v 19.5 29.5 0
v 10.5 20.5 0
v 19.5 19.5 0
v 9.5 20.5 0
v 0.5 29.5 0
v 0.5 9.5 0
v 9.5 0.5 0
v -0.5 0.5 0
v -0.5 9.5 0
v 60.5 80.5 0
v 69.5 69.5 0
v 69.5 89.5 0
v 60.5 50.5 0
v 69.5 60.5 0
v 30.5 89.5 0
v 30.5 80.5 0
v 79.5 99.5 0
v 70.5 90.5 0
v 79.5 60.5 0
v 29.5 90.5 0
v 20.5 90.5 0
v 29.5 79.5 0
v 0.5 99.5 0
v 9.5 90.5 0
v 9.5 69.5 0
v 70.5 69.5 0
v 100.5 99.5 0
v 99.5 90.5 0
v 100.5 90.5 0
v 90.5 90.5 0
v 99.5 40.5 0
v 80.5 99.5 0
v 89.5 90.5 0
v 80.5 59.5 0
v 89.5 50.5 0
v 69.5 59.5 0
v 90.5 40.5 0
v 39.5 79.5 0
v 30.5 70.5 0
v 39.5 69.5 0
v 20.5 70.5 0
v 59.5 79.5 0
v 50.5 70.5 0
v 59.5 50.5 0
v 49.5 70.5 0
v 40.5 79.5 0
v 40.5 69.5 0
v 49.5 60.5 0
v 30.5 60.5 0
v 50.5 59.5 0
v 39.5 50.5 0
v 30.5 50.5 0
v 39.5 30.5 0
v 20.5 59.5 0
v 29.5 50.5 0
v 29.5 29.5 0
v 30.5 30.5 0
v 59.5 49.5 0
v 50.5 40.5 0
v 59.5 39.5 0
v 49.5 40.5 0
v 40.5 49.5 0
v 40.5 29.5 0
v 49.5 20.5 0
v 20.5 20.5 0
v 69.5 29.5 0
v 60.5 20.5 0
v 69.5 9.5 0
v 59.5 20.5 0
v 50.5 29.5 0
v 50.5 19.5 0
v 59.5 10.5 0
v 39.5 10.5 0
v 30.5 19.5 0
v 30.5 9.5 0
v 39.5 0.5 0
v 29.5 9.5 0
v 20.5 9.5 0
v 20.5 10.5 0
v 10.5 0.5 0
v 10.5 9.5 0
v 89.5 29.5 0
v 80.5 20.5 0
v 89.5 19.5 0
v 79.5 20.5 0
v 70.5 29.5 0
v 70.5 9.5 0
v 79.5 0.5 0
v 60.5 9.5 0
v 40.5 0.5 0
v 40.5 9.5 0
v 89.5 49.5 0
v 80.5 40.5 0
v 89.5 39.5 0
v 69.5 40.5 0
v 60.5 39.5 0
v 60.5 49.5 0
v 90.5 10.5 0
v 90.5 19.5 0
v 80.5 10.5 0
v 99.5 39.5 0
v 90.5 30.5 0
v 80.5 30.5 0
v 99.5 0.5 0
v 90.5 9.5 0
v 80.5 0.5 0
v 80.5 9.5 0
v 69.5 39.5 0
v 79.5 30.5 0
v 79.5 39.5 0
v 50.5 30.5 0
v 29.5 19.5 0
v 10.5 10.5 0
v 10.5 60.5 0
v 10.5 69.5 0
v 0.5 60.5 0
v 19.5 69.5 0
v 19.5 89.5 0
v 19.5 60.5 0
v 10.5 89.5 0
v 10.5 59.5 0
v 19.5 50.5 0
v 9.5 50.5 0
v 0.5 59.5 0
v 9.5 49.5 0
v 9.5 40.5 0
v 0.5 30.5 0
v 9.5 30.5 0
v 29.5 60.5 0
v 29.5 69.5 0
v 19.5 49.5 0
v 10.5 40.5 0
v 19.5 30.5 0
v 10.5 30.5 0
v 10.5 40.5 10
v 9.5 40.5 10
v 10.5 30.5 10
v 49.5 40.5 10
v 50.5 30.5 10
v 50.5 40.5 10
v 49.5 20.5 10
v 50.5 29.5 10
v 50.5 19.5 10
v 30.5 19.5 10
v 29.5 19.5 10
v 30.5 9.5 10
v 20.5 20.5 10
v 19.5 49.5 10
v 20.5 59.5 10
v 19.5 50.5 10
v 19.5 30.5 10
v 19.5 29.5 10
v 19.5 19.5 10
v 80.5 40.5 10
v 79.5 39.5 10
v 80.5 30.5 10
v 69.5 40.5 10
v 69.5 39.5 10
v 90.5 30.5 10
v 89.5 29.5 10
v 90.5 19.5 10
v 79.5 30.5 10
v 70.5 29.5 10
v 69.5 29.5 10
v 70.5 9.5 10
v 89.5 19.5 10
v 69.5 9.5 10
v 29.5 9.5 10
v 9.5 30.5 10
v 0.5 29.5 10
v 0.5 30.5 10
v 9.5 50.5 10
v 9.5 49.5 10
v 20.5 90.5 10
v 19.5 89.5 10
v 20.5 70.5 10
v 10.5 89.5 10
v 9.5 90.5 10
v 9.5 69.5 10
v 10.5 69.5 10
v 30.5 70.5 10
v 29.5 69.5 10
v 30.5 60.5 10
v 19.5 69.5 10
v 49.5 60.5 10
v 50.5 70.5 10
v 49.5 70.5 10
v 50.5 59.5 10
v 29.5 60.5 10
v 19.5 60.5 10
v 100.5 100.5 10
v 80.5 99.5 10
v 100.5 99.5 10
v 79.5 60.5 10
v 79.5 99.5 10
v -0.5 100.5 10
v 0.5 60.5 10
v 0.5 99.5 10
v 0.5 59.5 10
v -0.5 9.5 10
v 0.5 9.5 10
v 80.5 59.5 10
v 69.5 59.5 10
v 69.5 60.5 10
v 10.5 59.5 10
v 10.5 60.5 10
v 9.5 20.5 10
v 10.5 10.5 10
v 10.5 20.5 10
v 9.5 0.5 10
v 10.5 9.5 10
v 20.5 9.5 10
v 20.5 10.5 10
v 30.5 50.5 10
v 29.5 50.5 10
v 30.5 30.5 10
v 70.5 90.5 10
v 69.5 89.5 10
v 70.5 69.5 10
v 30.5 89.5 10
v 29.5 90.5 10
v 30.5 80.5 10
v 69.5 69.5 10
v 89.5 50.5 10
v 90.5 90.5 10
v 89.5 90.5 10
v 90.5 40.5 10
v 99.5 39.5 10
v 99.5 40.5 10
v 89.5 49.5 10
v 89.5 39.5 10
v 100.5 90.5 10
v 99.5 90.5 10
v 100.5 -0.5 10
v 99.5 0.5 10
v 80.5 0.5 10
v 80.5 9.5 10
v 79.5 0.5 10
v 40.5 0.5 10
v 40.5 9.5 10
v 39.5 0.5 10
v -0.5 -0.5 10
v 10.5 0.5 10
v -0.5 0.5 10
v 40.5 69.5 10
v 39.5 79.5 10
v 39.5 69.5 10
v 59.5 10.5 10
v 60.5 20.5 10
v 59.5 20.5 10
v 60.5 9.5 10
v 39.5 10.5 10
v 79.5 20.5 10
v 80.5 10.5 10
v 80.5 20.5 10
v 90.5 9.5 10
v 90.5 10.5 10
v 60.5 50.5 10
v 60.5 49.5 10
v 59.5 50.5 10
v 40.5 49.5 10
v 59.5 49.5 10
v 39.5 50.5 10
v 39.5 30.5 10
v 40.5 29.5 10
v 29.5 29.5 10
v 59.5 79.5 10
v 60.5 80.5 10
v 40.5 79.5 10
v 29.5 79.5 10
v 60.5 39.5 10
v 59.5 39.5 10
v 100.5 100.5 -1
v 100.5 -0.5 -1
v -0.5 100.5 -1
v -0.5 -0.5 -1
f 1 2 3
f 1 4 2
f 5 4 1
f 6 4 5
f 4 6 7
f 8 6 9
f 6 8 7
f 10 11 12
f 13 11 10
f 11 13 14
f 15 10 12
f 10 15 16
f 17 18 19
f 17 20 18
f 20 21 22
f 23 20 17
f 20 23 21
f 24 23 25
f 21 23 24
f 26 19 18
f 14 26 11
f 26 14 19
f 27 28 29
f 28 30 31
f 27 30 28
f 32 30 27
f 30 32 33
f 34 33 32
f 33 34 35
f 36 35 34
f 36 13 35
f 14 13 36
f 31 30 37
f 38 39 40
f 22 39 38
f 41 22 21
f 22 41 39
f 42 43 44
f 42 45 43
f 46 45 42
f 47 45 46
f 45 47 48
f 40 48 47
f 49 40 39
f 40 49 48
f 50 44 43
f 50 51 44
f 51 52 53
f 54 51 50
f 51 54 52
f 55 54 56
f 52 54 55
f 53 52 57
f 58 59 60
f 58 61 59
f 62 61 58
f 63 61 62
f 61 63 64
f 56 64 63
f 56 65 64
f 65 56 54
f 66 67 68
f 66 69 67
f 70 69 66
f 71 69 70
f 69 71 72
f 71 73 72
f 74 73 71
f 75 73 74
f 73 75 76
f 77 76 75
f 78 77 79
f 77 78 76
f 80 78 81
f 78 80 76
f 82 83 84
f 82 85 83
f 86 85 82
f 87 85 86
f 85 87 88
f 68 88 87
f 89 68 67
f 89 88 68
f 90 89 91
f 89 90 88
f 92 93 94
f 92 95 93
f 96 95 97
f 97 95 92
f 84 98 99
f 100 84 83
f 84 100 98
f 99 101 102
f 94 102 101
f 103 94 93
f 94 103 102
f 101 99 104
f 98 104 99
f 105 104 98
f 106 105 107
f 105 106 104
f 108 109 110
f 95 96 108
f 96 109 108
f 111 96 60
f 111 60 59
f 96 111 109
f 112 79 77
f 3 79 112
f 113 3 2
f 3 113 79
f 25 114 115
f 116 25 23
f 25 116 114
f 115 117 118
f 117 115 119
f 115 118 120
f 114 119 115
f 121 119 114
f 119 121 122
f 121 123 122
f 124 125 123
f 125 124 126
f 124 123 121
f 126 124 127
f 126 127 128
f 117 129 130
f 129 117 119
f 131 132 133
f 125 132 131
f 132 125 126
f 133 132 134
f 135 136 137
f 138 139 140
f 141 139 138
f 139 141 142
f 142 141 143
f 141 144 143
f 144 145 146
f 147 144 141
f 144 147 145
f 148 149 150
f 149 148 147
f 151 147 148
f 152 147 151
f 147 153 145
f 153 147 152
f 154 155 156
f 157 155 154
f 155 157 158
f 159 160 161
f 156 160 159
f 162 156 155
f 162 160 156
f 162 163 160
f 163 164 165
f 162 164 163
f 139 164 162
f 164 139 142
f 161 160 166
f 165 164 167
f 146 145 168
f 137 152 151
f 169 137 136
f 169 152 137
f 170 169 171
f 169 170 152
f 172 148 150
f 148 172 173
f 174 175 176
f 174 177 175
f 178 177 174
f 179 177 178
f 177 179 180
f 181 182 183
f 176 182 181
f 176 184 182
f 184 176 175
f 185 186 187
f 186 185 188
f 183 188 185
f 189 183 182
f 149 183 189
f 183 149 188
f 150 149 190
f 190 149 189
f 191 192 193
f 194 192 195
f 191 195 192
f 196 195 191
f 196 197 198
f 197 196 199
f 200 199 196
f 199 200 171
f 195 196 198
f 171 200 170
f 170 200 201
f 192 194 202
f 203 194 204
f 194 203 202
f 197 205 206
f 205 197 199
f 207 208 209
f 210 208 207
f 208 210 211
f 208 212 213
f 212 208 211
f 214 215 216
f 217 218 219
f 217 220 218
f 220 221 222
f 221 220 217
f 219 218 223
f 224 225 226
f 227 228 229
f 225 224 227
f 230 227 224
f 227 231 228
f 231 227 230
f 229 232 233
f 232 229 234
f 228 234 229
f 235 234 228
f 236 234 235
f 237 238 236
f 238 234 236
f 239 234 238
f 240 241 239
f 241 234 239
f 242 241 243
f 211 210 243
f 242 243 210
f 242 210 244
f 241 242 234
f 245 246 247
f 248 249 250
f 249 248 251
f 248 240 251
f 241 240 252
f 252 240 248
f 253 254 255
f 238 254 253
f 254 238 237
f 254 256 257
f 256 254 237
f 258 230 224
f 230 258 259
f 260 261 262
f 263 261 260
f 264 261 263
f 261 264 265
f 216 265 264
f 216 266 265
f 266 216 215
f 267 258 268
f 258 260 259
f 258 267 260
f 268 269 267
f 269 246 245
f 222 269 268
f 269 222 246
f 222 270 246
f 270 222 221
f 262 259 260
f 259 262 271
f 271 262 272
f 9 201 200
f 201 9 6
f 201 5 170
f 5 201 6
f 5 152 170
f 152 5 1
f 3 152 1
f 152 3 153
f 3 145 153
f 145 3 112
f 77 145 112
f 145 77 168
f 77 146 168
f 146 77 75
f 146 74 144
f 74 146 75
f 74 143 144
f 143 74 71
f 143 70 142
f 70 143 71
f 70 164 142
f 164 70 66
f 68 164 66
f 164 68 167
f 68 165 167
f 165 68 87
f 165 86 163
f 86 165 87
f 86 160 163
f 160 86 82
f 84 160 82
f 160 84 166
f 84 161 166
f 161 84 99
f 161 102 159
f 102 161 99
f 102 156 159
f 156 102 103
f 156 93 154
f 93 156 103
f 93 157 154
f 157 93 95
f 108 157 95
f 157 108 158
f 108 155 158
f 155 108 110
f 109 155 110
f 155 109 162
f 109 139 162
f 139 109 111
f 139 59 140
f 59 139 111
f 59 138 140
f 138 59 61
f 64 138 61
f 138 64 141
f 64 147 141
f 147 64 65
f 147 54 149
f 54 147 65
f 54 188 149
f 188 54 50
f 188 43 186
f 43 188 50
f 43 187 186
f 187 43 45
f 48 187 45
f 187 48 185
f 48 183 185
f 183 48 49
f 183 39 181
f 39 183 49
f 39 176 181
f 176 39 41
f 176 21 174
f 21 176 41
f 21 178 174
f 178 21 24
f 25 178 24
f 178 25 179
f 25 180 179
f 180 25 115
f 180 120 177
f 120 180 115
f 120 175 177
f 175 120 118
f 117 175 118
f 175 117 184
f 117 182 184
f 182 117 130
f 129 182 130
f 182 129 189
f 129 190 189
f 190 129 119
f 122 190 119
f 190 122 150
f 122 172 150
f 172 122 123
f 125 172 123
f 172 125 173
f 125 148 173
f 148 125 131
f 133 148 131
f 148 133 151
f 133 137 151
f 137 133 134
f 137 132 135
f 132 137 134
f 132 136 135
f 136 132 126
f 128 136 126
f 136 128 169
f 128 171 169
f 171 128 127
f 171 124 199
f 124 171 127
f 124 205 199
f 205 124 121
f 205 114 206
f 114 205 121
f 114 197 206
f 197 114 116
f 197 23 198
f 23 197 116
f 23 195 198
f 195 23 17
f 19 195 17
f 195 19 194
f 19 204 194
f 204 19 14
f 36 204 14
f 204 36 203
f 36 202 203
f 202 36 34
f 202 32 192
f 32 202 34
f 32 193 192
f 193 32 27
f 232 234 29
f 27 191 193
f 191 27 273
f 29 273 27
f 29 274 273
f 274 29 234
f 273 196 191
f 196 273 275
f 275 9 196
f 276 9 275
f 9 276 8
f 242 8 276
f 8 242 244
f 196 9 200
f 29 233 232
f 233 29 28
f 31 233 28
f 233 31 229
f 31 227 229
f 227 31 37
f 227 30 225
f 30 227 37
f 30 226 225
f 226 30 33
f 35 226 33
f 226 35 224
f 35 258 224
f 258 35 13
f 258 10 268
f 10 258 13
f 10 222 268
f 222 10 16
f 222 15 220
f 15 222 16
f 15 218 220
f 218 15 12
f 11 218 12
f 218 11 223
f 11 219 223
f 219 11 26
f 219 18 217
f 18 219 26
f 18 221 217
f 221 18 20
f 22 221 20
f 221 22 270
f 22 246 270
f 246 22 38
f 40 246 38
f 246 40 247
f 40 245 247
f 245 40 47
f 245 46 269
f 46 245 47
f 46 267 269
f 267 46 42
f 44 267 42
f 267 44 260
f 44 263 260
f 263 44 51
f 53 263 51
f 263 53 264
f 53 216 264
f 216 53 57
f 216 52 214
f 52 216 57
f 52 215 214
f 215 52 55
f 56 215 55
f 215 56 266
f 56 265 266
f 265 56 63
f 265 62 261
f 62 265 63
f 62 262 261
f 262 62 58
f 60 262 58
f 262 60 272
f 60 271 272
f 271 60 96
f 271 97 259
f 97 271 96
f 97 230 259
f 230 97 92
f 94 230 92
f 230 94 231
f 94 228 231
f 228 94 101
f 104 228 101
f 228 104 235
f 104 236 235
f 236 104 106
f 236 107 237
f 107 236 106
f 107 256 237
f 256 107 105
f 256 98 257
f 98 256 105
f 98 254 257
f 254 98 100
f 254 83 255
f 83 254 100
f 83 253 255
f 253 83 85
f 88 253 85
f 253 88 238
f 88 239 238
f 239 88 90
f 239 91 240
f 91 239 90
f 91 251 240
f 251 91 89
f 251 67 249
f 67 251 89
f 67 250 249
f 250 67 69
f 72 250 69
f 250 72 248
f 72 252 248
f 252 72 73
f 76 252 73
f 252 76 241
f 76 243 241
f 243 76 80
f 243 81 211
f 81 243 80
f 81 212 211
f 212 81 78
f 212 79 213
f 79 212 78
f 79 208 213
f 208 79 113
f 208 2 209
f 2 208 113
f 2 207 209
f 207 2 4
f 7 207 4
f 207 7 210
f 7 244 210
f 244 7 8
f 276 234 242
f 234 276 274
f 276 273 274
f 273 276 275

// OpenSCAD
rows = 10; 
columns = 10; 
wall_thickness = 1;
wall_height = 10;
block_width = 10;
bottom = "YES";


/*
 * constants, for clearness
 *
 */
 
// random directions, for picking up a direction to visit the next block
function PERMUTATION_OF_FOUR() = [
    [1, 2, 3, 4],
    [1, 2, 4, 3],
    [1, 3, 2, 4],
    [1, 3, 4, 2],
    [1, 4, 2, 3],
    [1, 4, 3, 2],
    [2, 1, 3, 4],
    [2, 1, 4, 3],
    [2, 3, 1, 4],
    [2, 3, 4, 1],
    [2, 4, 1, 3],
    [2, 4, 3, 1],
    [3, 1, 2, 4],
    [3, 1, 4, 2],
    [3, 2, 1, 4],
    [3, 2, 4, 1],
    [3, 4, 1, 2],
    [3, 4, 2, 1],
    [4, 1, 2, 3],
    [4, 1, 3, 2],
    [4, 2, 1, 3],
    [4, 2, 3, 1],
    [4, 3, 1, 2],
    [4, 3, 2, 1]
];

function NO_WALL() = 0;
function UP_WALL() = 1;
function RIGHT_WALL() = 2;
function UP_RIGHT_WALL() = 3;

function NOT_VISITED() = 0;
function VISITED() = 1;

/* 
 * modules for creating a maze
 *
 */

// give a [x, y] point and length. draw a line in the x direction
module x_line(point, length, thickness = 1) {
    offset = thickness / 2;
    translate([point[0] - offset, point[1] - offset, 0]) 
        square([length + thickness, thickness]);
}

// give a [x, y] point and length. draw a line in the y direction
module y_line(point, length, thickness = 1) {
    offset = thickness / 2;
    translate([point[0] - offset, point[1] - offset, 0])  
        square([thickness, length + thickness]);
}

// create the outer wall of maze
module maze_outer_wall(rows, columns, block_width = 5, wall_thickness = 1) {
    x_line([0, rows * block_width], columns * block_width, wall_thickness);
    y_line([0, block_width], (rows - 1) * block_width, wall_thickness);
}

// create the inner wall of maze
module maze_inner_wall(maze, block_width = 5, wall_thickness = 1) {
    for(i = [0:len(maze) - 1]) {
        cord = maze[i];
        x = (cord[0] - 1) * block_width;
        y = (cord[1] - 1) * block_width;
        v = cord[3];
        
        if(v == 1 || v == 3) {
            x_line([x, y], block_width, wall_thickness);
        }
        if(v == 2 || v == 3) {
            y_line([x + block_width, y], block_width, wall_thickness);
        }
    }  
}

// create a maze
module maze(rows, columns, maze_vector, block_width = 5, wall_thickness = 1) {
     maze_outer_wall(rows, columns, block_width, wall_thickness);
     maze_inner_wall(maze_vector, block_width, wall_thickness);
}

/* 
 * utilities functions
 *
 */

// comare the equality of [x1, y1] and [x2, y2]
function cord_equals(cord1, cord2) = cord1 == cord2;

// is the point visited?
function not_visited(cord, vs, index = 0) =
    index == len(vs) ? true : 
        (cord_equals([vs[index][0], vs[index][1]], cord) && vs[index][2] == 1 ? false :
            not_visited(cord, vs, index + 1));
            
// pick a direction randomly
function rand_dirs() =
    PERMUTATION_OF_FOUR()[round(rands(0, 24, 1)[0])]; 

// replace v1 in the vector with v2 
function replace(v1, v2, vs) =
    [for(i = [0:len(vs) - 1]) vs[i] == v1 ? v2 : vs[i]];
    
/* 
 * functions for generating a maze vector
 *
 */

// initialize a maze
function init_maze(rows, columns) = 
    [
	    for(c = [1 : columns]) 
	        for(r = [1 : rows]) 
		        [c, r, 0,  UP_RIGHT_WALL()]
	];
    
// find a vector in the maze vector
function find(i, j, maze_vector, index = 0) =
    index == len(maze_vector) ? [] : (
        cord_equals([i, j], [maze_vector[index][0], maze_vector[index][1]]) ? maze_vector[index] : find(i, j, maze_vector, index + 1)
    );

////
// NO_WALL = 0;
// UP_WALL = 1;
// RIGHT_WALL = 2;
// UP_RIGHT_WALL = 3;
function delete_right_wall(original_block) = 
    original_block == NO_WALL() || original_block == RIGHT_WALL() ? NO_WALL() : UP_WALL();

function delete_up_wall(original_block) = 
    (original_block == NO_WALL() || original_block == UP_WALL()) ? NO_WALL() : RIGHT_WALL();
    
function delete_right_wall_of(vs, is_visited, maze_vector) =
    replace(vs, [vs[0], vs[1] , is_visited, delete_right_wall(vs[3])] ,maze_vector);

function delete_up_wall_of(vs, is_visited, maze_vector) =
    replace(vs, [vs[0], vs[1] , is_visited, delete_up_wall(vs[3])] ,maze_vector);

function go_right(i, j, rows, columns, maze_vector) =
    go_maze(i + 1, j, rows, columns, delete_right_wall_of(find(i, j, maze_vector), VISITED(), maze_vector));
    
function go_up(i, j, rows, columns, maze_vector) =
    go_maze(i, j - 1, rows, columns, delete_up_wall_of(find(i, j, maze_vector), VISITED(), maze_vector));
    
function visit(v, maze_vector) =
    replace(v, [v[0], v[1], VISITED(), v[3]], maze_vector);
 
function go_left(i, j, rows, columns, maze_vector) =
    go_maze(i - 1, j, rows, columns, delete_right_wall_of(find(i - 1, j, maze_vector), NOT_VISITED(), maze_vector));
    
function go_down(i, j, rows, columns, maze_vector) =
    go_maze(i, j + 1, rows, columns, delete_up_wall_of(find(i, j + 1, maze_vector), NOT_VISITED(), maze_vector));
    
function go_maze(i, j, rows, columns, maze_vector) =
    look_around(i, j, rand_dirs(), rows, columns, visit(find(i, j, maze_vector), maze_vector));
    
function look_around(i, j, dirs, rows, columns, maze_vector, index = 0) =
    index == 4 ? maze_vector : 
        look_around( 
            i, j, dirs, 
            rows, columns, 
            build_wall(i, j, dirs[index], rows, columns, maze_vector), 
            index + 1
        ); 

function build_wall(i, j, n, rows, columns, maze_vector) = 
    n == 1 && i != columns && not_visited([i + 1, j], maze_vector) ? go_right(i, j, rows, columns, maze_vector) : ( 
        n == 2 && j != 1 && not_visited([i, j - 1], maze_vector) ? go_up(i, j, rows, columns, maze_vector)  : (
            n == 3 && i != 1 && not_visited([i - 1, j], maze_vector) ? go_left(i, j,rows, columns,  maze_vector)  : (
                n == 4 && j != rows && not_visited([i, j + 1], maze_vector) ? go_down(i, j, rows, columns, maze_vector) : maze_vector
            ) 
        )
    ); 
 
/*
 * create a maze
 *
 */
maze_vector = go_maze(1, 1, rows, columns, replace([columns, rows, 0, UP_RIGHT_WALL()], [columns, rows, 0, UP_WALL()], init_maze(rows, columns)));
linear_extrude(wall_height) 
    maze(rows, columns, maze_vector, block_width, wall_thickness);
	
if(bottom == "YES") {
    translate([-wall_thickness / 2, -wall_thickness / 2, -wall_thickness]) 
	    linear_extrude(wall_thickness) square([block_width * columns + wall_thickness, block_width * rows + wall_thickness]);
}
